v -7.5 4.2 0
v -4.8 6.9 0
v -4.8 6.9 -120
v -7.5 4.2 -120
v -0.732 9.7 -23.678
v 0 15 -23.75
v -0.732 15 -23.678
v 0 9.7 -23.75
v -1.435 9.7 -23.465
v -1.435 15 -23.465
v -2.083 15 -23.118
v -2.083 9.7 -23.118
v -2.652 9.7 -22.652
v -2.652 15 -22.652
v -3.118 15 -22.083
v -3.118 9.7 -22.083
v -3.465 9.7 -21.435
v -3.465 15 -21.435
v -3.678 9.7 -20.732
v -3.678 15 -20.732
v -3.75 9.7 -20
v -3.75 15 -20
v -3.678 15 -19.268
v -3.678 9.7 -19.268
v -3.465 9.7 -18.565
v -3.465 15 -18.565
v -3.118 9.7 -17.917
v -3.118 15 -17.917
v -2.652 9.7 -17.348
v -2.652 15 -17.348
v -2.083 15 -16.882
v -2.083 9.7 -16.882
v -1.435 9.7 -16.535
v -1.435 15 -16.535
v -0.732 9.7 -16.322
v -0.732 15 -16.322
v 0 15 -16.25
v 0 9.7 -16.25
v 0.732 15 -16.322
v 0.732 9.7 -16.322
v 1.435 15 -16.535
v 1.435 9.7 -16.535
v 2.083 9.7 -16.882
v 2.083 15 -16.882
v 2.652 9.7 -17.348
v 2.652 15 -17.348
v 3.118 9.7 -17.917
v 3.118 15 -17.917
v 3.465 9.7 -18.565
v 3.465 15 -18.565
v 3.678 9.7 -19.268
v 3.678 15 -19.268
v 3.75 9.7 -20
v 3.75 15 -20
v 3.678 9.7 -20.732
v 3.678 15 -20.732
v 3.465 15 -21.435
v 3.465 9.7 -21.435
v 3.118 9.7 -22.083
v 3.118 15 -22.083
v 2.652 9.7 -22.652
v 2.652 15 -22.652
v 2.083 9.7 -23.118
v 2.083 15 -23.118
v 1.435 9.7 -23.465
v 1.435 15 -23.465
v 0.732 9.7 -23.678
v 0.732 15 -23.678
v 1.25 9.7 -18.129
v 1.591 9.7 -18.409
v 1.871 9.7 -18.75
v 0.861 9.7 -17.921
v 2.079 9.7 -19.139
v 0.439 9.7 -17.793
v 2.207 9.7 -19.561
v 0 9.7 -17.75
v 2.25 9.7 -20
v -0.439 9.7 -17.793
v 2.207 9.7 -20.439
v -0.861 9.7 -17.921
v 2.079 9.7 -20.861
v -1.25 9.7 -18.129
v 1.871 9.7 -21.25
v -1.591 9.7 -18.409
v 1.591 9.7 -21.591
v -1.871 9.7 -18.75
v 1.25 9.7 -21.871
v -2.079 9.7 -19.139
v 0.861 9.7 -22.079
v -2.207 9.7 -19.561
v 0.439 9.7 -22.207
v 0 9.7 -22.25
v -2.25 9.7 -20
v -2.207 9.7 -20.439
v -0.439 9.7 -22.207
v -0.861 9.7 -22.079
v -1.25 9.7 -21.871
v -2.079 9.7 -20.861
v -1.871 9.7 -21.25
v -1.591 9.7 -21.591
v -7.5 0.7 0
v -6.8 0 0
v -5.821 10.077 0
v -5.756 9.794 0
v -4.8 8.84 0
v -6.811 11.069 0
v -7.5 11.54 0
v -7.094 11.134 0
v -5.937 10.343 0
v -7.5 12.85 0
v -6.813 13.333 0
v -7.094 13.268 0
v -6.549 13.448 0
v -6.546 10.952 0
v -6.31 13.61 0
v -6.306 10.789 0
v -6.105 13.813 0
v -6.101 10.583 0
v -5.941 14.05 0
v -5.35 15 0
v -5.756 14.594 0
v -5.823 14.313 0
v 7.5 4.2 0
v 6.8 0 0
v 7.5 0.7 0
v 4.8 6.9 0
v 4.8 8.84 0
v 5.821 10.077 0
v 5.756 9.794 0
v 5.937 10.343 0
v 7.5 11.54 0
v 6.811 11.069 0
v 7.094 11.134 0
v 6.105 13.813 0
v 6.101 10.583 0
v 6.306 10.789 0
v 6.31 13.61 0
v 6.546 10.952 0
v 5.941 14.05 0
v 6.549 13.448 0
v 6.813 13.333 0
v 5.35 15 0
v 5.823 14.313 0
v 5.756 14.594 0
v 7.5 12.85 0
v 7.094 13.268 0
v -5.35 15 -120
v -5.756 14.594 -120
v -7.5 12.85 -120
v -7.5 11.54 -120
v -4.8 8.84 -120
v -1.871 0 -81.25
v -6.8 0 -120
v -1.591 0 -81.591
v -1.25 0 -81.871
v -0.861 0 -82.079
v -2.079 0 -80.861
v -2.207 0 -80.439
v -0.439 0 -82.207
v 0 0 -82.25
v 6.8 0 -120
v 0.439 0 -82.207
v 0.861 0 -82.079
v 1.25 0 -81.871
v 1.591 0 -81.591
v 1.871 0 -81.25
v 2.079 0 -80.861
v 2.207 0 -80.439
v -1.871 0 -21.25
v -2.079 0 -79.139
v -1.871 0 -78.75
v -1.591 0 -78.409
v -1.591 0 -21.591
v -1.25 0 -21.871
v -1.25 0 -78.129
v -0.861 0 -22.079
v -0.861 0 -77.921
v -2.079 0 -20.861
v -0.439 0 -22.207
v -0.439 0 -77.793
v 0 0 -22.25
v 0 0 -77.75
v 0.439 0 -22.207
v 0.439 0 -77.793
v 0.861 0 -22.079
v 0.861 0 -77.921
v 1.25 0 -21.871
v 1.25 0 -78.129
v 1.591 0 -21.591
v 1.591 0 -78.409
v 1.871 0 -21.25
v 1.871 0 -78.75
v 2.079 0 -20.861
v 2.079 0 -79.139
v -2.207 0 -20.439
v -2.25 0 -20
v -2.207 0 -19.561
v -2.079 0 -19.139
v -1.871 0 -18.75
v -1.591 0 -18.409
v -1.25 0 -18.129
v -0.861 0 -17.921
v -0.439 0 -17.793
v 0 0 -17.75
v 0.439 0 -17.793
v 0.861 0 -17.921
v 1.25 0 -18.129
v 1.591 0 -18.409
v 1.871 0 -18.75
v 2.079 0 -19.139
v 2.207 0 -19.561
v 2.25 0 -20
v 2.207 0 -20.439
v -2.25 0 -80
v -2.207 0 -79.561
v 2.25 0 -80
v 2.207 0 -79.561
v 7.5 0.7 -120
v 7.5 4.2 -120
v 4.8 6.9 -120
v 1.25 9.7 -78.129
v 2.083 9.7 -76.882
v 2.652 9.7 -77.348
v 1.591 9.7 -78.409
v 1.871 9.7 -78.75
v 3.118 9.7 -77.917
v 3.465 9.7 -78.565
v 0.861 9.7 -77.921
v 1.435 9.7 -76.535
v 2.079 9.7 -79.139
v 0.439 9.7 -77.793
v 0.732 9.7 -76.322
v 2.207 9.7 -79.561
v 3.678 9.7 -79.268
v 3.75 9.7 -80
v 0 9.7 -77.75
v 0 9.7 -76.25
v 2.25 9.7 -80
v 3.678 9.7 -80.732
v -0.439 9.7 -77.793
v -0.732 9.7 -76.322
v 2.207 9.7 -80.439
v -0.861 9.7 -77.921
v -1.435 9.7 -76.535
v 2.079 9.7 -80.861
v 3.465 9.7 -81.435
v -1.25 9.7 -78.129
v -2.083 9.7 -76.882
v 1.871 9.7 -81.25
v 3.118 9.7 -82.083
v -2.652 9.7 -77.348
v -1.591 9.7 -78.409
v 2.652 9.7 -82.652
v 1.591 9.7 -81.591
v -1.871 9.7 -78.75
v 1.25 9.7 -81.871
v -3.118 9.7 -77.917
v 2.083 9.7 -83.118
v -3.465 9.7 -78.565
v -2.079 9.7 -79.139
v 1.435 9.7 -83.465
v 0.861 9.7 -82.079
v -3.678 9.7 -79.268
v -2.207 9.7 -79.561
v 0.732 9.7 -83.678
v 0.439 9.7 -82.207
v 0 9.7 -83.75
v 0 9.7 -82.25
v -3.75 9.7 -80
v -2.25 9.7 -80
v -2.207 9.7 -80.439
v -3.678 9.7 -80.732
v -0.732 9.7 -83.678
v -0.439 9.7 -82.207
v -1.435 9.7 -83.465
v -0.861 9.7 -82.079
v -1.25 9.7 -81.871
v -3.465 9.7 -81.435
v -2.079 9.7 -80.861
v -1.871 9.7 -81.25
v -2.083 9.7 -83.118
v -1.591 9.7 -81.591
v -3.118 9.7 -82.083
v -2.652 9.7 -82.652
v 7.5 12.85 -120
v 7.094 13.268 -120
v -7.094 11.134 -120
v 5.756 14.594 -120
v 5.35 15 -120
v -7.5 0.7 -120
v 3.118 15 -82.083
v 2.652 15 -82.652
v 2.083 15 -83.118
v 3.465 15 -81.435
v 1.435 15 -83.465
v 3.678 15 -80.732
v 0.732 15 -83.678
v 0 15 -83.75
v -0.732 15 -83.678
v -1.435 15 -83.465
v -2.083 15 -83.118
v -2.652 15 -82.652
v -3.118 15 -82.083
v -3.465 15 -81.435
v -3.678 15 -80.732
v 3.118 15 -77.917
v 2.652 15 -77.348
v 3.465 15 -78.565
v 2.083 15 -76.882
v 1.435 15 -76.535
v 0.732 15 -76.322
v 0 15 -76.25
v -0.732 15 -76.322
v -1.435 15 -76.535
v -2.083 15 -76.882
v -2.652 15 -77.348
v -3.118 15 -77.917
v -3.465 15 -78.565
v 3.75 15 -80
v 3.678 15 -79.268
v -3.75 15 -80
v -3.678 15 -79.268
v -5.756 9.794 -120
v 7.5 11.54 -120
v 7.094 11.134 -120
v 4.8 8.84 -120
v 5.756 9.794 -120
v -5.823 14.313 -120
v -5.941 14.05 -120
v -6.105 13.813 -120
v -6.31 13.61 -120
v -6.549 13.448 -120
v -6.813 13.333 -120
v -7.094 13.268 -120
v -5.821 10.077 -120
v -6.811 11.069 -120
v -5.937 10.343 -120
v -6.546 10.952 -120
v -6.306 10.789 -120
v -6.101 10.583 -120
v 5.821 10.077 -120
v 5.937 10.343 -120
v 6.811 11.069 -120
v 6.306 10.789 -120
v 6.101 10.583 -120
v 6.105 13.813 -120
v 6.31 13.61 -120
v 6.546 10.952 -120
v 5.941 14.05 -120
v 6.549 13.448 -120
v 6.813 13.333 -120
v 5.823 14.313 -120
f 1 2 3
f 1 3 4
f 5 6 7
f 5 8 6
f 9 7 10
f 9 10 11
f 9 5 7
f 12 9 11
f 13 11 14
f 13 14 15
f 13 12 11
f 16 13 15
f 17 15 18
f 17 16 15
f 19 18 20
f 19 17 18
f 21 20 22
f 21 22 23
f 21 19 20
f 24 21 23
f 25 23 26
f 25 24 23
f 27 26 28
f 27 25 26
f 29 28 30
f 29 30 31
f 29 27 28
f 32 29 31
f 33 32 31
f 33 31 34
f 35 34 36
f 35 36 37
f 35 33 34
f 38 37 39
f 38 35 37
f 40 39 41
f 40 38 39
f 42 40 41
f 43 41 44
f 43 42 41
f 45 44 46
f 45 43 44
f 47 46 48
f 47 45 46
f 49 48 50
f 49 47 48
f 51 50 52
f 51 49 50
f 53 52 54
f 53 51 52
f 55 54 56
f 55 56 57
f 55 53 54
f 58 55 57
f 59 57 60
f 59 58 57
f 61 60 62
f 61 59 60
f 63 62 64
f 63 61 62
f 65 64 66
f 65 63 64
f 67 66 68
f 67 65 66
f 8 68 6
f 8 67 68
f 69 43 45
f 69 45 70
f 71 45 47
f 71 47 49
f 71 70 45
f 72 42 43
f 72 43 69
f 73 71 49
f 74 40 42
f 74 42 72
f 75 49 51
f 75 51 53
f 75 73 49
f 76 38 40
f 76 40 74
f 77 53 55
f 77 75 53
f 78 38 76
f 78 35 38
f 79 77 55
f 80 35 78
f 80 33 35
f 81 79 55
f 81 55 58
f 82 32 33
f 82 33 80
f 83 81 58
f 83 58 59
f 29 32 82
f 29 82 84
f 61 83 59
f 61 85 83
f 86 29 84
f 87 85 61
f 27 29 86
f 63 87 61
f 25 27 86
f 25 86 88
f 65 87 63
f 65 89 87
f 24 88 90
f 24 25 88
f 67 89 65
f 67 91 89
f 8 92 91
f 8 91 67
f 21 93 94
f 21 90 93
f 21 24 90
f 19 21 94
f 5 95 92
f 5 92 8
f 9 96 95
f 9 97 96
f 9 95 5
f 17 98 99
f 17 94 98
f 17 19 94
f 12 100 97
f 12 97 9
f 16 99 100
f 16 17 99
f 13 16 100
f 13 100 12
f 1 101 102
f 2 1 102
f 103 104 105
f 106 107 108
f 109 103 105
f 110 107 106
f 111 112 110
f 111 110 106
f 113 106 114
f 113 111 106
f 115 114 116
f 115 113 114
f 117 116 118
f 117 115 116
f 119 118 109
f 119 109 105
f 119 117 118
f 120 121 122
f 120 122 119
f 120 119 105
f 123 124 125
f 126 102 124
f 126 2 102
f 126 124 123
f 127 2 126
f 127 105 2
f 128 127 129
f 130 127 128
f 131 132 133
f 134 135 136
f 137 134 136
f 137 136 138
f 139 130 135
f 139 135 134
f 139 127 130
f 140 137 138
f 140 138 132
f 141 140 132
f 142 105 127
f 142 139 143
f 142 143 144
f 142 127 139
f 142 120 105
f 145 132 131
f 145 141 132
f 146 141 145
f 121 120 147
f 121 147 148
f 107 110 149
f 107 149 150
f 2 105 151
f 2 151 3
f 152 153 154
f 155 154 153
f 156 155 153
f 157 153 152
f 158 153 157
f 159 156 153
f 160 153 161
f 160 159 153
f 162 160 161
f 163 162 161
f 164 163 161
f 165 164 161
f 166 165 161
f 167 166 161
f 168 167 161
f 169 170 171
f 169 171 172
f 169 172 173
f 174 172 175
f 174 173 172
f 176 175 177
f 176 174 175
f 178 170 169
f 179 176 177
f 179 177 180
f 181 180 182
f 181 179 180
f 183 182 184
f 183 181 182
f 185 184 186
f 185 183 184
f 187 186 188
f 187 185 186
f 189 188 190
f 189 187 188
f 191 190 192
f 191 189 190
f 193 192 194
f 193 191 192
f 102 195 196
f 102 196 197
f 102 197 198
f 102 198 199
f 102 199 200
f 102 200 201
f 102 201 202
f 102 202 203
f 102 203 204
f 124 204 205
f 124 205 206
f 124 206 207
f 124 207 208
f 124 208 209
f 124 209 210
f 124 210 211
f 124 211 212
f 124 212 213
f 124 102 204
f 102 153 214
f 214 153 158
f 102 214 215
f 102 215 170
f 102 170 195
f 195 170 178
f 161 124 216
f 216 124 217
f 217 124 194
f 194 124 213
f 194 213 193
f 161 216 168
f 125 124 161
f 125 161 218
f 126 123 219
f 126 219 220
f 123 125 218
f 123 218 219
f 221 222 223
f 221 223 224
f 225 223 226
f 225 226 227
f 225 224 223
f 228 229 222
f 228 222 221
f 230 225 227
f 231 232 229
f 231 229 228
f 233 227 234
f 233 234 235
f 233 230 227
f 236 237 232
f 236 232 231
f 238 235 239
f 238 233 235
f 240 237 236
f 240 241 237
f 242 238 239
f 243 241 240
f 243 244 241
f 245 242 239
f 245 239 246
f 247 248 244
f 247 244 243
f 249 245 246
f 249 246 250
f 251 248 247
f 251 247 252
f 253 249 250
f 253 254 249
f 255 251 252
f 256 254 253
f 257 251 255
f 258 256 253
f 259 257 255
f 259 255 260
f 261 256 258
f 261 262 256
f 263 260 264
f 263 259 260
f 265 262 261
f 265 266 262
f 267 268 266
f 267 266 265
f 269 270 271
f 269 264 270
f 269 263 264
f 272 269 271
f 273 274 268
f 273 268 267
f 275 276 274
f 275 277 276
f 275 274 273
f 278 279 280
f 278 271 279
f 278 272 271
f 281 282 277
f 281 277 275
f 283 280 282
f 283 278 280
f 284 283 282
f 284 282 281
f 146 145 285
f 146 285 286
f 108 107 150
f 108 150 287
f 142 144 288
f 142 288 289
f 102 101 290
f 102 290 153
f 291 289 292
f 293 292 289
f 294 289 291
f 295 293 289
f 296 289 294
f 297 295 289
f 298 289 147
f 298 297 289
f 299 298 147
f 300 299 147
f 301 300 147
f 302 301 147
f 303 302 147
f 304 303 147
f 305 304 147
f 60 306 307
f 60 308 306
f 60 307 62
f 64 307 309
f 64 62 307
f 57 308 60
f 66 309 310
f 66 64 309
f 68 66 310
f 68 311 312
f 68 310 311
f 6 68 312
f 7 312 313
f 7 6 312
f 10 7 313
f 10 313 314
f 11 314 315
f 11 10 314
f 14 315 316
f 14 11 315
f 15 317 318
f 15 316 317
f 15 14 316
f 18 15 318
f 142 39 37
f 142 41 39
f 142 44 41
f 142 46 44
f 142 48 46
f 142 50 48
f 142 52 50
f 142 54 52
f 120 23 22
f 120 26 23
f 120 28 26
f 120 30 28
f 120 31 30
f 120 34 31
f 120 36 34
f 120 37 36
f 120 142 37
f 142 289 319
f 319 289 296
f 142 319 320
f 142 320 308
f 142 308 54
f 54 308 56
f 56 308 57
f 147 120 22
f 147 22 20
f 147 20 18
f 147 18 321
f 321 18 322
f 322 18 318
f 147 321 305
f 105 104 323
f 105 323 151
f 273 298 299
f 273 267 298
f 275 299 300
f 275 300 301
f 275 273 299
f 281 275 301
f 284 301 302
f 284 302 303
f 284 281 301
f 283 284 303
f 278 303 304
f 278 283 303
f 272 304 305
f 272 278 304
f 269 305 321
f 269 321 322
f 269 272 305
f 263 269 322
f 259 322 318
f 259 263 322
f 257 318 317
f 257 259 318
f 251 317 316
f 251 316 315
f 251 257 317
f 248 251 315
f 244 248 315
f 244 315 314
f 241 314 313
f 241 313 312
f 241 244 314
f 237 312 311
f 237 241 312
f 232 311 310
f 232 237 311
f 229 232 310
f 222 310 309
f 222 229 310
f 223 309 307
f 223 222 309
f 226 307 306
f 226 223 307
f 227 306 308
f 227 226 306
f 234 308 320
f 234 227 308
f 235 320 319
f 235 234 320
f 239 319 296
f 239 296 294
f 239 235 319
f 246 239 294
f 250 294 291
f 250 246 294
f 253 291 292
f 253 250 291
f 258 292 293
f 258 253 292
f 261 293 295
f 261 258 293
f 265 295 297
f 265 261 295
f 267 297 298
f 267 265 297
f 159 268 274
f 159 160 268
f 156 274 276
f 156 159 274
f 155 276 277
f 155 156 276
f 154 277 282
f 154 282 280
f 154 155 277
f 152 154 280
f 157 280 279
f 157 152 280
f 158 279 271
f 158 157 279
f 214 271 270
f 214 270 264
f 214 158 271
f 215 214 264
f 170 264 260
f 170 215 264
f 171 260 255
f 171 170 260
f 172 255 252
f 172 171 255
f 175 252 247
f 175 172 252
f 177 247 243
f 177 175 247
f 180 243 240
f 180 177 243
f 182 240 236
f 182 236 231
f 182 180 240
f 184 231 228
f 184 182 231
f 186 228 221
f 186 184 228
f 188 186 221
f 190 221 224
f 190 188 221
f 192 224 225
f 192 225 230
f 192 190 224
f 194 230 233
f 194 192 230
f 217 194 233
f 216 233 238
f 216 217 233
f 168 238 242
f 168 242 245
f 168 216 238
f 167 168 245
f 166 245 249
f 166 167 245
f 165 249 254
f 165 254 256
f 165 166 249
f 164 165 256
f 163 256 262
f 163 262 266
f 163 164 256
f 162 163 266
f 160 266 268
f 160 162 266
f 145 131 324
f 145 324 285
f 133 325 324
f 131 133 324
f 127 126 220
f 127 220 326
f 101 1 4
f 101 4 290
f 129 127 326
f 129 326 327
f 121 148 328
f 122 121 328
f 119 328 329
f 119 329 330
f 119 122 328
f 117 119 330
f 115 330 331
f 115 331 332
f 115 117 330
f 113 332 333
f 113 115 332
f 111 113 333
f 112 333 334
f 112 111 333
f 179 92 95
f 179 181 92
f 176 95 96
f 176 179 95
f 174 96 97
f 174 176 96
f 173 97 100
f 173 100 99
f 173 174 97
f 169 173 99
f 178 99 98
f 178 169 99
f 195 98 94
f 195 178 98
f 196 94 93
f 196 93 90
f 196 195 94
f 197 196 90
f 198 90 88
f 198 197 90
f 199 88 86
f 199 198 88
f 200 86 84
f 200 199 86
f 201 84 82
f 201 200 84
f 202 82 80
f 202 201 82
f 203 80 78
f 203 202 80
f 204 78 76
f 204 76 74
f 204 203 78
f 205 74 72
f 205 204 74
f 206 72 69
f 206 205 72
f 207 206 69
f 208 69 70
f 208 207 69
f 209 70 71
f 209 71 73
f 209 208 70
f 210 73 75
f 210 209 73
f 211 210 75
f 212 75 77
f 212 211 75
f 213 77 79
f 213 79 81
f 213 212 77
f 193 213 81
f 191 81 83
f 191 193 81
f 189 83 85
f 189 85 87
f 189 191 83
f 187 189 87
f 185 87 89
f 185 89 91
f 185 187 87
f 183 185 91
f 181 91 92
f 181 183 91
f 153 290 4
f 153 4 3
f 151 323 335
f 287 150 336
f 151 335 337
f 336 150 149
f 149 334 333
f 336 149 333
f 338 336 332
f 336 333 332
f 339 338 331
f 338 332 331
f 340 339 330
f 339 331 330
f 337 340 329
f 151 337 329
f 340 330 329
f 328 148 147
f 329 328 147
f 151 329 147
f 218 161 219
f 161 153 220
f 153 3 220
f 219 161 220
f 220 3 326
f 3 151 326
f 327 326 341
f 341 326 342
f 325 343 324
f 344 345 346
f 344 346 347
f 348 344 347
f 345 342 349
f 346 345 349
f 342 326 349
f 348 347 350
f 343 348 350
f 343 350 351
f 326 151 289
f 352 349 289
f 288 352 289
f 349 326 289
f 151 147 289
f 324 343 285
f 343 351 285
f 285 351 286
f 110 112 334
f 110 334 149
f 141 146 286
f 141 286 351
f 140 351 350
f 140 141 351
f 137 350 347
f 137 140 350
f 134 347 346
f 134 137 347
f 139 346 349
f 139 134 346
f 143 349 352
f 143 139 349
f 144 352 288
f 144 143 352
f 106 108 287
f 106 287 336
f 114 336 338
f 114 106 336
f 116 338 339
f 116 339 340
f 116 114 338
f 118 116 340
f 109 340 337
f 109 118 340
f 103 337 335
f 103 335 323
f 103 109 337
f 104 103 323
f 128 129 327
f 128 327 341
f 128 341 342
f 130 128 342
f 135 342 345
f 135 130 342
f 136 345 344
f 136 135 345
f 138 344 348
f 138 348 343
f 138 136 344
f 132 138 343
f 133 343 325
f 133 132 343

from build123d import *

# Parameters (mm, degrees)
EXTRUDE1_DEPTH  = 120
LPATTERN1_COUNT = 2
LPATTERN1_PITCH = 60


with BuildPart() as part:
    # Sketch1 → Extrude1 (new body)
    with BuildSketch(Plane(origin=(-20, 0, 0), x_dir=(1, 0, 0), z_dir=(0, 0, 1))):
        with BuildLine():
            Line((12.5, 0.69999271), (13.199992786, 0))
            Line((13.199992786, 0), (26.800007214, 0))
            Line((26.800007214, 0), (27.5, 0.69999271))
            Line((27.5, 0.69999271), (27.5, 4.2000246))
            Line((27.5, 4.2000246), (24.8000183, 6.9000063))
            Line((24.8000183, 6.9000063), (24.8000183, 8.8400054))
            Line((24.8000183, 8.8400054), (25.755946813, 9.794179118))
            ThreePointArc((25.755946813, 9.794179118), (26.198484624, 10.690600567), (27.09432569, 11.13431209))
            Line((27.09432569, 11.13431209), (27.5, 11.5399866))
            Line((27.5, 11.5399866), (27.5, 12.8500204))
            Line((27.5, 12.8500204), (27.09432569, 13.268442751))
            ThreePointArc((27.09432569, 13.268442751), (26.202460867, 13.706434947), (25.755946813, 14.594063938))
            Line((25.755946813, 14.594063938), (25.3500197, 15))
            Line((25.3500197, 15), (14.6499803, 15))
            Line((14.6499803, 15), (14.244053187, 14.594063938))
            ThreePointArc((14.244053187, 14.594063938), (13.797539133, 13.706434947), (12.90567431, 13.268442751))
            Line((12.90567431, 13.268442751), (12.5, 12.8500204))
            Line((12.5, 12.8500204), (12.5, 11.5399866))
            Line((12.5, 11.5399866), (12.90567431, 11.13431209))
            ThreePointArc((12.90567431, 11.13431209), (13.801515376, 10.690600567), (14.244053187, 9.794179118))
            Line((14.244053187, 9.794179118), (15.1999817, 8.8400054))
            Line((15.1999817, 8.8400054), (15.1999817, 6.9000063))
            Line((15.1999817, 6.9000063), (12.5, 4.2000246))
            Line((12.5, 4.2000246), (12.5, 0.69999271))
        make_face()
    extrude(amount=-EXTRUDE1_DEPTH)

    # Sketch2 → Cut-Revolve1 (revolve, cut)
    with BuildSketch(Plane(origin=(0, 0, 0), x_dir=(0, 0, -1), z_dir=(1, 0, 0))):
        Polygon((20, 15), (23.75, 15), (23.75, 9.7), (22.25, 9.7), (22.25, 0), (20, 0), align=None)
    cut_revolve1 = revolve(axis=Axis((0, 0, -20), (0, 1, 0)), mode=Mode.SUBTRACT)

    # LPattern1: Cut-Revolve1 ×2
    with Locations(*[(0, 0, -i * LPATTERN1_PITCH) for i in range(1, LPATTERN1_COUNT)]):
        add(cut_revolve1, mode=Mode.SUBTRACT)


solid = part.part
